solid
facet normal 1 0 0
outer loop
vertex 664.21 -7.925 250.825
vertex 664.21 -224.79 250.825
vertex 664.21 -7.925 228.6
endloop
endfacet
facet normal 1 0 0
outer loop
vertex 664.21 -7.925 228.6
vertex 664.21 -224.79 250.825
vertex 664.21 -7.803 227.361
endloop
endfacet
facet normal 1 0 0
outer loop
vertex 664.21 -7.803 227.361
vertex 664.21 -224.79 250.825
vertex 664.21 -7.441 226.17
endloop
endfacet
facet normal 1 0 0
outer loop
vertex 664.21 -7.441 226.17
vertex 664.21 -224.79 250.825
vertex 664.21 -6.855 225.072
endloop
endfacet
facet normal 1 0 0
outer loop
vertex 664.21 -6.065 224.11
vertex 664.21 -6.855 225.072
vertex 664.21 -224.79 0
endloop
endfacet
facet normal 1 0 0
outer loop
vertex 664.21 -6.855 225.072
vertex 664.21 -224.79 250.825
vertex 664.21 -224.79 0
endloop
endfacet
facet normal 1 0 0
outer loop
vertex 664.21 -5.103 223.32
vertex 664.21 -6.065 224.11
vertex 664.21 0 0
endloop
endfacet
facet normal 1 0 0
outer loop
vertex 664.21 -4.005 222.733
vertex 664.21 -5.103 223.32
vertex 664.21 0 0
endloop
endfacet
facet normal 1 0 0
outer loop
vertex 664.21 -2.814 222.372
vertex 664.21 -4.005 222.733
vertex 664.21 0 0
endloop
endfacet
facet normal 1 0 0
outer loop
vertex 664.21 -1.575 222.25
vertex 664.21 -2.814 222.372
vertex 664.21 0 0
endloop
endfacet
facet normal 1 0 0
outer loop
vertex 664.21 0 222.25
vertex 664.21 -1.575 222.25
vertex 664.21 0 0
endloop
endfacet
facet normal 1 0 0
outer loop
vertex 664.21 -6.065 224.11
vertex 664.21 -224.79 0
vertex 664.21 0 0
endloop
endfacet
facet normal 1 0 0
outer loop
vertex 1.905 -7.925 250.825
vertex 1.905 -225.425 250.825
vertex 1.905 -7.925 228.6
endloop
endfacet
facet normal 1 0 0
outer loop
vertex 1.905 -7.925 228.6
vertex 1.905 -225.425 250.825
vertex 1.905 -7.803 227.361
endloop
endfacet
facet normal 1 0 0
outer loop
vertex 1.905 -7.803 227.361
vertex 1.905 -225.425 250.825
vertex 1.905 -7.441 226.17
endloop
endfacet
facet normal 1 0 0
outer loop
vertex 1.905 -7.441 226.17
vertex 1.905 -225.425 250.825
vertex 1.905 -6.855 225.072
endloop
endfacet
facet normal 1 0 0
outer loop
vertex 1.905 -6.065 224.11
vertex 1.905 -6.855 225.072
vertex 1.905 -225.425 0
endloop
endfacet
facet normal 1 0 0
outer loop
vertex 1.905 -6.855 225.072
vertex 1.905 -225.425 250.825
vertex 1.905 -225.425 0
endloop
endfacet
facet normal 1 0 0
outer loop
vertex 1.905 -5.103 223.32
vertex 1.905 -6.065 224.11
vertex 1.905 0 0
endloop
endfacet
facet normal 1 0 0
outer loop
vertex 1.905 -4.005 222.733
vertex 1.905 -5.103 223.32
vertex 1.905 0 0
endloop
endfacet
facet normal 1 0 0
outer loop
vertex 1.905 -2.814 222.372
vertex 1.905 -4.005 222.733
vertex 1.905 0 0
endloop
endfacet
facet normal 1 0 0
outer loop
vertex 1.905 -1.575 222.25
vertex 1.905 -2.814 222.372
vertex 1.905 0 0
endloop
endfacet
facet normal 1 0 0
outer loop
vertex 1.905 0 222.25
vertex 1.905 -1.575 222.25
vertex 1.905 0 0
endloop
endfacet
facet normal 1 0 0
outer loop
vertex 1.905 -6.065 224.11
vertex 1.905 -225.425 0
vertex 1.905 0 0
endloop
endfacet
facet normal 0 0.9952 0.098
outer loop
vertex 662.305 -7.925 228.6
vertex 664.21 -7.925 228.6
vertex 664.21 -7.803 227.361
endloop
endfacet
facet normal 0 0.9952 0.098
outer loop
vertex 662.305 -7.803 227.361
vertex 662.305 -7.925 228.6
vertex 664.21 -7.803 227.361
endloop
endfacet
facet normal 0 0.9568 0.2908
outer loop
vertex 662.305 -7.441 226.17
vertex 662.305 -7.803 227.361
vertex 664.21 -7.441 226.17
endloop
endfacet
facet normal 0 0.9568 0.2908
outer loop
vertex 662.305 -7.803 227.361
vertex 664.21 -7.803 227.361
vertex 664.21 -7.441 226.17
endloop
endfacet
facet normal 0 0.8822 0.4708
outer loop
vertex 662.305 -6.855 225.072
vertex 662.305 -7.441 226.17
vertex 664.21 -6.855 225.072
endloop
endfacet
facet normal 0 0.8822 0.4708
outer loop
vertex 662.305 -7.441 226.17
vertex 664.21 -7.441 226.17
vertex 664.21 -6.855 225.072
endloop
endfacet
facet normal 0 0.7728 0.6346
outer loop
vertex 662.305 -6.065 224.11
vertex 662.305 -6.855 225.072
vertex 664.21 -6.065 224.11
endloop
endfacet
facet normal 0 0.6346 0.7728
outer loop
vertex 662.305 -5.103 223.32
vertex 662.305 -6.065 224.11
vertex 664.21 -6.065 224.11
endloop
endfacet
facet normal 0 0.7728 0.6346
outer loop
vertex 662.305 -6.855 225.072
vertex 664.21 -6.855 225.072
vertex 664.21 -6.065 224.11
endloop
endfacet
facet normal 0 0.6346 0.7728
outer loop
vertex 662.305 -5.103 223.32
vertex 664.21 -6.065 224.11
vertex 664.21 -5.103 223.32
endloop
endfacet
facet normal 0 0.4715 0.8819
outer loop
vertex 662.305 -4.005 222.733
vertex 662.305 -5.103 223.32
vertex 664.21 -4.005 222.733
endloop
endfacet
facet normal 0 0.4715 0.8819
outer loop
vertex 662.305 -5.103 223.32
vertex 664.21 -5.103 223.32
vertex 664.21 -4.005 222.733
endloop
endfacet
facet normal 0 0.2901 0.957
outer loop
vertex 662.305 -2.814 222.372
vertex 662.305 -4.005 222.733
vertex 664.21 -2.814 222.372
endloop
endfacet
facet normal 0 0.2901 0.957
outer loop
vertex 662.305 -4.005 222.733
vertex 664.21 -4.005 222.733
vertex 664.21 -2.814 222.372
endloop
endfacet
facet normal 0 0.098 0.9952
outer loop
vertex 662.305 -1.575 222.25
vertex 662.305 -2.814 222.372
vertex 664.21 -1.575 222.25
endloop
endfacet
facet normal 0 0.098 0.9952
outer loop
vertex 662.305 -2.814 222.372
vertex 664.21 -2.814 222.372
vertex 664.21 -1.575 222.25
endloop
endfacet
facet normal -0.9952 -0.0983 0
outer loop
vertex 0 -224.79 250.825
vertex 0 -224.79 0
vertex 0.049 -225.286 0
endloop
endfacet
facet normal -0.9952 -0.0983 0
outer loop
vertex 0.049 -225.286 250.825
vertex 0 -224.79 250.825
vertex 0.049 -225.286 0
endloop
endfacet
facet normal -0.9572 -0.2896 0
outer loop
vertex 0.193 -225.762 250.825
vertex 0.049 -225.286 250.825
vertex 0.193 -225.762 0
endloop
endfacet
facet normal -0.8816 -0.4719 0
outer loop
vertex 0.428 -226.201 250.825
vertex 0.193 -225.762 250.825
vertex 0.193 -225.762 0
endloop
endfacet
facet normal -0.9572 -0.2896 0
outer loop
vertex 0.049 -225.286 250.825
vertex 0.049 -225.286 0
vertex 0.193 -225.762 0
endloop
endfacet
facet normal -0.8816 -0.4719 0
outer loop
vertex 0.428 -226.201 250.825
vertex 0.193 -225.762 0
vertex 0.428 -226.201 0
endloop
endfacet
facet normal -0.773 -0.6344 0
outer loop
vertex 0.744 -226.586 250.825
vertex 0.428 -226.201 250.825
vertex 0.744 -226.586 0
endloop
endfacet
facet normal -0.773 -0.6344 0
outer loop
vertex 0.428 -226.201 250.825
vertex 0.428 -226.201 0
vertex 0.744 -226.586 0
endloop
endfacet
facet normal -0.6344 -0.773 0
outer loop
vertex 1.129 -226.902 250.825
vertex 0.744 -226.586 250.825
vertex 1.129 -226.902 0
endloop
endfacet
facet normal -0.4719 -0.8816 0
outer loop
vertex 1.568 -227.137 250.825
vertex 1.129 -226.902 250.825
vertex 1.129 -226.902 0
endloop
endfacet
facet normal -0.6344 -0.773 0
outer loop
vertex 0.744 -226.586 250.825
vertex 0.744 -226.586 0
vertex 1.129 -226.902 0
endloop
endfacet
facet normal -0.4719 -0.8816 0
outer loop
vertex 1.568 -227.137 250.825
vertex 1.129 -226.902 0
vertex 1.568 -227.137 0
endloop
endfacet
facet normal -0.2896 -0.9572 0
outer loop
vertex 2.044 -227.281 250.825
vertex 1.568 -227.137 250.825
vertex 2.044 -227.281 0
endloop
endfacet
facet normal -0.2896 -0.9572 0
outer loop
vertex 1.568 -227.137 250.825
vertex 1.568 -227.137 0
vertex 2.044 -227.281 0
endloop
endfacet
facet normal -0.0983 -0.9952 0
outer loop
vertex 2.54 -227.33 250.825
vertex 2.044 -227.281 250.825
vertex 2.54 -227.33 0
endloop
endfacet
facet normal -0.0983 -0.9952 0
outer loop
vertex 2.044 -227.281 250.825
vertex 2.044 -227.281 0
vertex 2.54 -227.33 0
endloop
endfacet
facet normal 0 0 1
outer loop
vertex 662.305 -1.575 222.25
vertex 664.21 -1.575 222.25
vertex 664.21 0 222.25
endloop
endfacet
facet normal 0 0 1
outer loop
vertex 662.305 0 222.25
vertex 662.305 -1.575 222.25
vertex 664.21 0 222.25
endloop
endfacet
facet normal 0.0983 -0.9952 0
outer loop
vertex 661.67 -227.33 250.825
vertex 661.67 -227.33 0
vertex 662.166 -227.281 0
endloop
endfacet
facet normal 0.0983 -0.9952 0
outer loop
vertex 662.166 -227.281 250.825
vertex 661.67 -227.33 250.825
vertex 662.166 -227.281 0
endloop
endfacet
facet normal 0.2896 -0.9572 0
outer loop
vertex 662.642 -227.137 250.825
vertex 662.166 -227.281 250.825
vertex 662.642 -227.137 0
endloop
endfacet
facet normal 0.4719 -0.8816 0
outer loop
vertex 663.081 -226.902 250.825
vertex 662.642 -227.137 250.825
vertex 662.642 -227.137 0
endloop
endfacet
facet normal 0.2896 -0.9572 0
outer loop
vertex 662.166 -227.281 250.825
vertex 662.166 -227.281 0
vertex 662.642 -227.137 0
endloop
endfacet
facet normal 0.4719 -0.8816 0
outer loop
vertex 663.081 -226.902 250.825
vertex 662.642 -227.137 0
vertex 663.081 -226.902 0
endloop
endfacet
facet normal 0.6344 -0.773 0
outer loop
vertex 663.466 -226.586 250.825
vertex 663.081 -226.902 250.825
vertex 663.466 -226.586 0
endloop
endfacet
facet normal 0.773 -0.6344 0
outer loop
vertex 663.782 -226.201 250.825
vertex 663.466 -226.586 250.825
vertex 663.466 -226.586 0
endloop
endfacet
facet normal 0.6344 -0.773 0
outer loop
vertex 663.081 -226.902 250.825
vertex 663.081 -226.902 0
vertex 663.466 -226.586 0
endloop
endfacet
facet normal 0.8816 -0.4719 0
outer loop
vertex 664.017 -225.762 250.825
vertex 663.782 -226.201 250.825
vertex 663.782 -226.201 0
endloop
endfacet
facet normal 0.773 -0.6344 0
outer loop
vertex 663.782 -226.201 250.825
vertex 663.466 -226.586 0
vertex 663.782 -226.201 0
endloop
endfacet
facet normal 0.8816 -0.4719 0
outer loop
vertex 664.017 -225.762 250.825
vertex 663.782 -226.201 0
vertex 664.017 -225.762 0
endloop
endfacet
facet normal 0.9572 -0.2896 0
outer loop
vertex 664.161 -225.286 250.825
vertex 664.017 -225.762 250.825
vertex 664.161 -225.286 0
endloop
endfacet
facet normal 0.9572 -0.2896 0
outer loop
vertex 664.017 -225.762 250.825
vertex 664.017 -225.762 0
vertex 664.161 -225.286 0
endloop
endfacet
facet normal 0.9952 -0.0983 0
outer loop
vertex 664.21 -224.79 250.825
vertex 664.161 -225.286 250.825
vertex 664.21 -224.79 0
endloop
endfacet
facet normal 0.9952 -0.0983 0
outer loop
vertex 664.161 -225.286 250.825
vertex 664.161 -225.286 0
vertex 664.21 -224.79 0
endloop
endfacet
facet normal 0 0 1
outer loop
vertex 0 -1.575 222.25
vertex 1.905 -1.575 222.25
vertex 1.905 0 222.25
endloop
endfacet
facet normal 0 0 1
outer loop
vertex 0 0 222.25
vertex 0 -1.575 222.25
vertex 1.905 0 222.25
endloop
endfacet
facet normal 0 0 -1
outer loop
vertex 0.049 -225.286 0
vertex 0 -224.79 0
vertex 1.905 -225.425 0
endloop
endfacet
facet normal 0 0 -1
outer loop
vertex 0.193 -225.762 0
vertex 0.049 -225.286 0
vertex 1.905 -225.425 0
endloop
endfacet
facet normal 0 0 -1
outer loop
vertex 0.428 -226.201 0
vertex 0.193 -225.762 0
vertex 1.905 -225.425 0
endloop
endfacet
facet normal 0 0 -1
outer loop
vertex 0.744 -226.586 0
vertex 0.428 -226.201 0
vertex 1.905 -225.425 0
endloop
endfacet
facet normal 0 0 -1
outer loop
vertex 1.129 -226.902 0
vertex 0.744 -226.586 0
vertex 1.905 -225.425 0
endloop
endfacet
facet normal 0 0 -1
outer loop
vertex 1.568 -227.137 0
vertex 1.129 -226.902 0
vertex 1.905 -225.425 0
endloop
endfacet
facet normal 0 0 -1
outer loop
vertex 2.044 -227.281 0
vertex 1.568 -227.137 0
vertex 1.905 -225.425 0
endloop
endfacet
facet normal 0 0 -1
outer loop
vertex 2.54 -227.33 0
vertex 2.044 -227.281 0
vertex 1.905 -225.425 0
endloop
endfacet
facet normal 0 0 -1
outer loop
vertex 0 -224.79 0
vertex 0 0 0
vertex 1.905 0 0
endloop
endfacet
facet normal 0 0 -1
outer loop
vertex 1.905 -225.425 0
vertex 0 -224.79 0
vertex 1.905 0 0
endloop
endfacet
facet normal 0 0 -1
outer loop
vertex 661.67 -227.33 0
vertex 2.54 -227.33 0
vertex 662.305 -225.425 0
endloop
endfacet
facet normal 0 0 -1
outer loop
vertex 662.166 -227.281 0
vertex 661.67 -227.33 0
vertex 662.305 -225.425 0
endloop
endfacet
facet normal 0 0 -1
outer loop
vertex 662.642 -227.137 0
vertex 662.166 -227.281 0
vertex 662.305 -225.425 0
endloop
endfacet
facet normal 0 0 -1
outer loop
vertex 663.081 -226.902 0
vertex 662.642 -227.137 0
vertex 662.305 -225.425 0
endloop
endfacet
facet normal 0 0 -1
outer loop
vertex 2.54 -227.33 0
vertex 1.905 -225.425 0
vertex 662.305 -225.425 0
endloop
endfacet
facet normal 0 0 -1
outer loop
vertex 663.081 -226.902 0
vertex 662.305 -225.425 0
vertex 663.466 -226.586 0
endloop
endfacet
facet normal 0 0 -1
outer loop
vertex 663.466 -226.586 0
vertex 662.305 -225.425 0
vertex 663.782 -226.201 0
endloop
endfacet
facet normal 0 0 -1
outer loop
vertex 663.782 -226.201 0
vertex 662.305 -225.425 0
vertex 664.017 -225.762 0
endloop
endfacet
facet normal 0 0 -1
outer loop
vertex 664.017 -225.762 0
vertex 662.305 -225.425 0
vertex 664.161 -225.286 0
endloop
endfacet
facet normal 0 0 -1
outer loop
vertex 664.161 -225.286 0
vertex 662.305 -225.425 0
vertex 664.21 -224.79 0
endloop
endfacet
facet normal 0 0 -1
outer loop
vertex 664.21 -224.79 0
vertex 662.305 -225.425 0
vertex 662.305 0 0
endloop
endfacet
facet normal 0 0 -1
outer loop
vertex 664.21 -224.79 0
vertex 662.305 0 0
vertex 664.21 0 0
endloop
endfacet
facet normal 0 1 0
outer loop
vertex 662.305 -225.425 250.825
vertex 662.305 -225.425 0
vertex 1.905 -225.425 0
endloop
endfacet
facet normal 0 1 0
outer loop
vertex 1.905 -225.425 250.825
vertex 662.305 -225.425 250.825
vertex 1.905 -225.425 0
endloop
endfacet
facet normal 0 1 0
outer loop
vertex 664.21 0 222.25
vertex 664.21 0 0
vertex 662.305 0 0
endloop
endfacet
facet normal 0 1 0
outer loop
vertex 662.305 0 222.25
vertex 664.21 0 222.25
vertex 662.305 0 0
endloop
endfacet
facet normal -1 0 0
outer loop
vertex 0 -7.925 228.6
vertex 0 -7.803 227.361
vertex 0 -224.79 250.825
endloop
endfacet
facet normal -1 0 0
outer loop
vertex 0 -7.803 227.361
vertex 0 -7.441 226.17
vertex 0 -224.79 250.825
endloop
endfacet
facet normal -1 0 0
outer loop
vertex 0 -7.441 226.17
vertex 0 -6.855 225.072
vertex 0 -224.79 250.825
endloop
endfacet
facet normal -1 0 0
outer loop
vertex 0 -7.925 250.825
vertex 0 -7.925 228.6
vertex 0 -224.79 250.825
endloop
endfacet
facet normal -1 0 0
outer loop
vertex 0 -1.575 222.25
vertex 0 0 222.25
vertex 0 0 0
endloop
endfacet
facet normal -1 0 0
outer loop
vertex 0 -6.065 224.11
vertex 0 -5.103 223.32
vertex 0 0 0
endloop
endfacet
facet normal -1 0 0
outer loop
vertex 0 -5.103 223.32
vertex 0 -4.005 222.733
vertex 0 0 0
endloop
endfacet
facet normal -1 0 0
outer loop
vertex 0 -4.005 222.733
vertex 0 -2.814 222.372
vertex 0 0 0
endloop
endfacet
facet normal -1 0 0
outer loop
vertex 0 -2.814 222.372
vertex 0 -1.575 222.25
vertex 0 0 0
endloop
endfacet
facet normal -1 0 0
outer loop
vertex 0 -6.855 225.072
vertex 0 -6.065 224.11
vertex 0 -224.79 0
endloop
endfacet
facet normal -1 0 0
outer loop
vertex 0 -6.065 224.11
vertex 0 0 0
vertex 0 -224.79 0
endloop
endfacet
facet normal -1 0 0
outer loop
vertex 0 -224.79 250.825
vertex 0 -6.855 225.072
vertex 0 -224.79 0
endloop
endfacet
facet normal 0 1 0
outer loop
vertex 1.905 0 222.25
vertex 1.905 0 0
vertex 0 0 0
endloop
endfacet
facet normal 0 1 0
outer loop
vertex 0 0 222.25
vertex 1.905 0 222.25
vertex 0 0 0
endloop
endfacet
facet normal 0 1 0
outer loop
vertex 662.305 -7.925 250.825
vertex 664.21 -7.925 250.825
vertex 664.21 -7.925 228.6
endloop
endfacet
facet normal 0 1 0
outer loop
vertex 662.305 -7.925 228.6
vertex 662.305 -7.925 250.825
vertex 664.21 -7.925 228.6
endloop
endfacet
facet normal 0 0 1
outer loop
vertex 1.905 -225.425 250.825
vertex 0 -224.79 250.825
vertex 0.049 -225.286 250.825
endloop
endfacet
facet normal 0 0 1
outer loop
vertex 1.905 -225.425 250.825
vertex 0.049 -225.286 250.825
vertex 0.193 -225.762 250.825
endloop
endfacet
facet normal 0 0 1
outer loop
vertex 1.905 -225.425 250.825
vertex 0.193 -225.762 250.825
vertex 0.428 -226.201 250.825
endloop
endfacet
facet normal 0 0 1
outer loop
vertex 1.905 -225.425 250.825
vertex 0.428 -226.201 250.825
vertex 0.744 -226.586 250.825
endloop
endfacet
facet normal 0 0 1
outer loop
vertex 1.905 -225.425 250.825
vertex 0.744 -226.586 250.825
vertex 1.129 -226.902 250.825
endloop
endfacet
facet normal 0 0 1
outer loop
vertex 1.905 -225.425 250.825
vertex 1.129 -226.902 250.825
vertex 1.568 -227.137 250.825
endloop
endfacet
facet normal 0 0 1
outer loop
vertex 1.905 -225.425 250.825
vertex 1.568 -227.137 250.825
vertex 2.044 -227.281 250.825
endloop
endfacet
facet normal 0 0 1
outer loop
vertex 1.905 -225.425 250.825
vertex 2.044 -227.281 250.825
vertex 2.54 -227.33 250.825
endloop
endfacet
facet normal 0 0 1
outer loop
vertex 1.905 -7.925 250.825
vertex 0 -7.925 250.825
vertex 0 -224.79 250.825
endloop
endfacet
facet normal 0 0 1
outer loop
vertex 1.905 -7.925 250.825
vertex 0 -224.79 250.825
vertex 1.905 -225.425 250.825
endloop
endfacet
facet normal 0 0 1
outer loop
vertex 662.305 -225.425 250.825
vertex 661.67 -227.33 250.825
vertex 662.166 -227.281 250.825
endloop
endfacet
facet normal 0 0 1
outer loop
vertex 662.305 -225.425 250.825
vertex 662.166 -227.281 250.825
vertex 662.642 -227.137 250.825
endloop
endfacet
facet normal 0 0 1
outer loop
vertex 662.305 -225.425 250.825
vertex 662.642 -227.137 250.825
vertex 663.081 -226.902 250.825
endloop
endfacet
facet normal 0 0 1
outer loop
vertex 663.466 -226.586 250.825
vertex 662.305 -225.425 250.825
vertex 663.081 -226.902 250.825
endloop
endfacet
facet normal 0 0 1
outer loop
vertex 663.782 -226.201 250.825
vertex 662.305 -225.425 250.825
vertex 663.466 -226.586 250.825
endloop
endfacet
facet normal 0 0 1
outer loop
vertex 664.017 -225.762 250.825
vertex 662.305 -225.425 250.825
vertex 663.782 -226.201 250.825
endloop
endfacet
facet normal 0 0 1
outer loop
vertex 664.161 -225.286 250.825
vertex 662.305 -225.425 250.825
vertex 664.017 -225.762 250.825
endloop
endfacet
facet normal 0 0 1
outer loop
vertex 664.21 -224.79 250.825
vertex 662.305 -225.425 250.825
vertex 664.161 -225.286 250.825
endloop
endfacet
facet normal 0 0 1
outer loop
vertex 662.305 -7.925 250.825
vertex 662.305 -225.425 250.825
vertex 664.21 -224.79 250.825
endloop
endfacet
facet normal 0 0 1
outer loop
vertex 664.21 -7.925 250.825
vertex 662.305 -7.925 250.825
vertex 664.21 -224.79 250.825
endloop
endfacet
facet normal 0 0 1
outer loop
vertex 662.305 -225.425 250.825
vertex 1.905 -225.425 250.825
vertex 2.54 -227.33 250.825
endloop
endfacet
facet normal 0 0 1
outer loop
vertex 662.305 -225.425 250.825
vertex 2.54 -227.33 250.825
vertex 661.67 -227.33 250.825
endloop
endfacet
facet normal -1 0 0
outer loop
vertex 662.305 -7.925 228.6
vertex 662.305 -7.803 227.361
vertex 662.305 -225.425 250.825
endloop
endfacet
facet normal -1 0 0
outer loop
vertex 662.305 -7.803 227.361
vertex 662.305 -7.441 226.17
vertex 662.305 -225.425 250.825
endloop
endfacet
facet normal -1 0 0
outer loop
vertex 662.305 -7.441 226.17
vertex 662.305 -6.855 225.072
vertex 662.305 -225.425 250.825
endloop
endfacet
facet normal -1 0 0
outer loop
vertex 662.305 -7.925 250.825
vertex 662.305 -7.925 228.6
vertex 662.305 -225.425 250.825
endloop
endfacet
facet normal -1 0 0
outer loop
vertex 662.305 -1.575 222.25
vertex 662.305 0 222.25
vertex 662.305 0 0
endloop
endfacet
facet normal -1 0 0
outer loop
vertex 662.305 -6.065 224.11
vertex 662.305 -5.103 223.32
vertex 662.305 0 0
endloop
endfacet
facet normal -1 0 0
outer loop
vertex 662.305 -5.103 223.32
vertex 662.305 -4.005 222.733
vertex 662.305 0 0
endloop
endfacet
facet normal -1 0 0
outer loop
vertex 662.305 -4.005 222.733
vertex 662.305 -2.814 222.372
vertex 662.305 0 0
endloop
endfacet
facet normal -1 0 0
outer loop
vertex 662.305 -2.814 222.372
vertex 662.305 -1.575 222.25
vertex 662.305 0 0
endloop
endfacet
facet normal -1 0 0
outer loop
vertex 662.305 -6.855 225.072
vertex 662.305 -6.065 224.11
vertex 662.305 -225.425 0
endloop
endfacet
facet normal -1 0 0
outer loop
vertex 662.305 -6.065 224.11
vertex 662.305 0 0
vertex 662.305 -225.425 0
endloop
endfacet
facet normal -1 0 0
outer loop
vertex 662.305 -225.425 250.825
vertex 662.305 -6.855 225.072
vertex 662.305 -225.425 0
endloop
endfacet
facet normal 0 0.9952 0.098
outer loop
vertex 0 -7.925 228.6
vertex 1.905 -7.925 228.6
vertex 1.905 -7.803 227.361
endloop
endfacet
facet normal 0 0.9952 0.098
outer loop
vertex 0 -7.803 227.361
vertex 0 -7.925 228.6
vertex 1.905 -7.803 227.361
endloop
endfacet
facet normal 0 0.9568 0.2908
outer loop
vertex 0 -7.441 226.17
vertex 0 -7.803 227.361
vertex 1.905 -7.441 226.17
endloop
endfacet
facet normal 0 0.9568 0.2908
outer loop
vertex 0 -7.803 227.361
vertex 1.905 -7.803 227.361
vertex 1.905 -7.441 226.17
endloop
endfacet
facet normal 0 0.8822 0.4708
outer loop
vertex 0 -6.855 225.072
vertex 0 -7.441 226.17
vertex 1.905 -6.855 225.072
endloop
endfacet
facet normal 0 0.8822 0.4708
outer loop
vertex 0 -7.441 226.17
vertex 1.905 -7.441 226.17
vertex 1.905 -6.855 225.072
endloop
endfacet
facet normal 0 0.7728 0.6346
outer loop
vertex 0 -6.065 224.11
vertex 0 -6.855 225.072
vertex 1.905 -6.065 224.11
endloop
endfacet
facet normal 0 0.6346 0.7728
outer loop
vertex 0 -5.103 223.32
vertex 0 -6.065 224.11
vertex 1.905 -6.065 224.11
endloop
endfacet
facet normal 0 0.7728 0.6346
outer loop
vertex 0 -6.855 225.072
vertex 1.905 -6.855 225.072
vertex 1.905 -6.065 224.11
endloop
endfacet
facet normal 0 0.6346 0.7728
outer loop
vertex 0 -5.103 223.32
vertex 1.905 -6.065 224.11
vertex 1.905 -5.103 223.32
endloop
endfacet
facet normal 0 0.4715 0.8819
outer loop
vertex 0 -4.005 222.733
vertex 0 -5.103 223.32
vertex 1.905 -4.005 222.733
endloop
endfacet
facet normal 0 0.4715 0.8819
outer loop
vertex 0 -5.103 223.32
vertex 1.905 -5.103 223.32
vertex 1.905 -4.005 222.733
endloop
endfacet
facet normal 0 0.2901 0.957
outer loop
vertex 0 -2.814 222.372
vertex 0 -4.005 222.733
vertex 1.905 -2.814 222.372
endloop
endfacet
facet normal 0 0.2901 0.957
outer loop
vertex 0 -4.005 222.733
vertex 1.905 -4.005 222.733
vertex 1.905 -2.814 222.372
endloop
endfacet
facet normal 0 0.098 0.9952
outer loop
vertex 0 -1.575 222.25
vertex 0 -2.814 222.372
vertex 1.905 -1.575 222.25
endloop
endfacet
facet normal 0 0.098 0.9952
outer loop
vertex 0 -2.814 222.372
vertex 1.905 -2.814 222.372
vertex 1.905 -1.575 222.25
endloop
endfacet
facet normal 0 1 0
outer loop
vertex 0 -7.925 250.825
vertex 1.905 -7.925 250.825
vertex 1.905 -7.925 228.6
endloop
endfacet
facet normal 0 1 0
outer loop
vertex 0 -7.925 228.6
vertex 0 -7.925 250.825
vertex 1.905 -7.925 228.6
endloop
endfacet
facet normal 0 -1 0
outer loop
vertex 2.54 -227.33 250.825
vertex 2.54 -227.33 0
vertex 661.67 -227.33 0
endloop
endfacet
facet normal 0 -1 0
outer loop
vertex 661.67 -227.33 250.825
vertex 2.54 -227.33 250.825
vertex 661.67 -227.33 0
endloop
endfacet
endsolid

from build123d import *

# Parameters (mm, degrees)
F1_DEPTH = 250.825
F3_DEPTH = 664.211


with BuildPart() as f1:
    # F0 (on Top) → F1 (new body)
    with BuildSketch(Plane.XY):
        with BuildLine():
            ThreePointArc((0, -224.79), (0.743949, -226.586051), (2.54, -227.33))
            Line((2.54, -227.33), (661.67, -227.33))
            ThreePointArc((661.67, -227.33), (663.466051, -226.586051), (664.21, -224.79))
            Line((664.21, -224.79), (664.21, 0))
            Line((664.21, 0), (662.305, 0))
            Line((662.305, 0), (662.305, -225.425))
            Line((662.305, -225.425), (1.905, -225.425))
            Line((1.905, -225.425), (1.905, 0))
            Line((1.905, 0), (0, 0))
            Line((0, 0), (0, -224.79))
        make_face()
    extrude(amount=F1_DEPTH)

    # F2 (on face) → F3 (cut, through all)
    with BuildSketch(Plane.YZ.offset(664.21)):
        with BuildLine():
            ThreePointArc((-7.9248, 228.6), (-6.064928, 224.109872), (-1.5748, 222.25))
            Line((-1.5748, 222.25), (0, 222.25))
            Line((0, 222.25), (0, 250.825))
            Line((0, 250.825), (-7.9248, 250.825))
            Line((-7.9248, 250.825), (-7.9248, 228.6))
        make_face()
    extrude(amount=-F3_DEPTH, mode=Mode.SUBTRACT)


solid = f1.part
